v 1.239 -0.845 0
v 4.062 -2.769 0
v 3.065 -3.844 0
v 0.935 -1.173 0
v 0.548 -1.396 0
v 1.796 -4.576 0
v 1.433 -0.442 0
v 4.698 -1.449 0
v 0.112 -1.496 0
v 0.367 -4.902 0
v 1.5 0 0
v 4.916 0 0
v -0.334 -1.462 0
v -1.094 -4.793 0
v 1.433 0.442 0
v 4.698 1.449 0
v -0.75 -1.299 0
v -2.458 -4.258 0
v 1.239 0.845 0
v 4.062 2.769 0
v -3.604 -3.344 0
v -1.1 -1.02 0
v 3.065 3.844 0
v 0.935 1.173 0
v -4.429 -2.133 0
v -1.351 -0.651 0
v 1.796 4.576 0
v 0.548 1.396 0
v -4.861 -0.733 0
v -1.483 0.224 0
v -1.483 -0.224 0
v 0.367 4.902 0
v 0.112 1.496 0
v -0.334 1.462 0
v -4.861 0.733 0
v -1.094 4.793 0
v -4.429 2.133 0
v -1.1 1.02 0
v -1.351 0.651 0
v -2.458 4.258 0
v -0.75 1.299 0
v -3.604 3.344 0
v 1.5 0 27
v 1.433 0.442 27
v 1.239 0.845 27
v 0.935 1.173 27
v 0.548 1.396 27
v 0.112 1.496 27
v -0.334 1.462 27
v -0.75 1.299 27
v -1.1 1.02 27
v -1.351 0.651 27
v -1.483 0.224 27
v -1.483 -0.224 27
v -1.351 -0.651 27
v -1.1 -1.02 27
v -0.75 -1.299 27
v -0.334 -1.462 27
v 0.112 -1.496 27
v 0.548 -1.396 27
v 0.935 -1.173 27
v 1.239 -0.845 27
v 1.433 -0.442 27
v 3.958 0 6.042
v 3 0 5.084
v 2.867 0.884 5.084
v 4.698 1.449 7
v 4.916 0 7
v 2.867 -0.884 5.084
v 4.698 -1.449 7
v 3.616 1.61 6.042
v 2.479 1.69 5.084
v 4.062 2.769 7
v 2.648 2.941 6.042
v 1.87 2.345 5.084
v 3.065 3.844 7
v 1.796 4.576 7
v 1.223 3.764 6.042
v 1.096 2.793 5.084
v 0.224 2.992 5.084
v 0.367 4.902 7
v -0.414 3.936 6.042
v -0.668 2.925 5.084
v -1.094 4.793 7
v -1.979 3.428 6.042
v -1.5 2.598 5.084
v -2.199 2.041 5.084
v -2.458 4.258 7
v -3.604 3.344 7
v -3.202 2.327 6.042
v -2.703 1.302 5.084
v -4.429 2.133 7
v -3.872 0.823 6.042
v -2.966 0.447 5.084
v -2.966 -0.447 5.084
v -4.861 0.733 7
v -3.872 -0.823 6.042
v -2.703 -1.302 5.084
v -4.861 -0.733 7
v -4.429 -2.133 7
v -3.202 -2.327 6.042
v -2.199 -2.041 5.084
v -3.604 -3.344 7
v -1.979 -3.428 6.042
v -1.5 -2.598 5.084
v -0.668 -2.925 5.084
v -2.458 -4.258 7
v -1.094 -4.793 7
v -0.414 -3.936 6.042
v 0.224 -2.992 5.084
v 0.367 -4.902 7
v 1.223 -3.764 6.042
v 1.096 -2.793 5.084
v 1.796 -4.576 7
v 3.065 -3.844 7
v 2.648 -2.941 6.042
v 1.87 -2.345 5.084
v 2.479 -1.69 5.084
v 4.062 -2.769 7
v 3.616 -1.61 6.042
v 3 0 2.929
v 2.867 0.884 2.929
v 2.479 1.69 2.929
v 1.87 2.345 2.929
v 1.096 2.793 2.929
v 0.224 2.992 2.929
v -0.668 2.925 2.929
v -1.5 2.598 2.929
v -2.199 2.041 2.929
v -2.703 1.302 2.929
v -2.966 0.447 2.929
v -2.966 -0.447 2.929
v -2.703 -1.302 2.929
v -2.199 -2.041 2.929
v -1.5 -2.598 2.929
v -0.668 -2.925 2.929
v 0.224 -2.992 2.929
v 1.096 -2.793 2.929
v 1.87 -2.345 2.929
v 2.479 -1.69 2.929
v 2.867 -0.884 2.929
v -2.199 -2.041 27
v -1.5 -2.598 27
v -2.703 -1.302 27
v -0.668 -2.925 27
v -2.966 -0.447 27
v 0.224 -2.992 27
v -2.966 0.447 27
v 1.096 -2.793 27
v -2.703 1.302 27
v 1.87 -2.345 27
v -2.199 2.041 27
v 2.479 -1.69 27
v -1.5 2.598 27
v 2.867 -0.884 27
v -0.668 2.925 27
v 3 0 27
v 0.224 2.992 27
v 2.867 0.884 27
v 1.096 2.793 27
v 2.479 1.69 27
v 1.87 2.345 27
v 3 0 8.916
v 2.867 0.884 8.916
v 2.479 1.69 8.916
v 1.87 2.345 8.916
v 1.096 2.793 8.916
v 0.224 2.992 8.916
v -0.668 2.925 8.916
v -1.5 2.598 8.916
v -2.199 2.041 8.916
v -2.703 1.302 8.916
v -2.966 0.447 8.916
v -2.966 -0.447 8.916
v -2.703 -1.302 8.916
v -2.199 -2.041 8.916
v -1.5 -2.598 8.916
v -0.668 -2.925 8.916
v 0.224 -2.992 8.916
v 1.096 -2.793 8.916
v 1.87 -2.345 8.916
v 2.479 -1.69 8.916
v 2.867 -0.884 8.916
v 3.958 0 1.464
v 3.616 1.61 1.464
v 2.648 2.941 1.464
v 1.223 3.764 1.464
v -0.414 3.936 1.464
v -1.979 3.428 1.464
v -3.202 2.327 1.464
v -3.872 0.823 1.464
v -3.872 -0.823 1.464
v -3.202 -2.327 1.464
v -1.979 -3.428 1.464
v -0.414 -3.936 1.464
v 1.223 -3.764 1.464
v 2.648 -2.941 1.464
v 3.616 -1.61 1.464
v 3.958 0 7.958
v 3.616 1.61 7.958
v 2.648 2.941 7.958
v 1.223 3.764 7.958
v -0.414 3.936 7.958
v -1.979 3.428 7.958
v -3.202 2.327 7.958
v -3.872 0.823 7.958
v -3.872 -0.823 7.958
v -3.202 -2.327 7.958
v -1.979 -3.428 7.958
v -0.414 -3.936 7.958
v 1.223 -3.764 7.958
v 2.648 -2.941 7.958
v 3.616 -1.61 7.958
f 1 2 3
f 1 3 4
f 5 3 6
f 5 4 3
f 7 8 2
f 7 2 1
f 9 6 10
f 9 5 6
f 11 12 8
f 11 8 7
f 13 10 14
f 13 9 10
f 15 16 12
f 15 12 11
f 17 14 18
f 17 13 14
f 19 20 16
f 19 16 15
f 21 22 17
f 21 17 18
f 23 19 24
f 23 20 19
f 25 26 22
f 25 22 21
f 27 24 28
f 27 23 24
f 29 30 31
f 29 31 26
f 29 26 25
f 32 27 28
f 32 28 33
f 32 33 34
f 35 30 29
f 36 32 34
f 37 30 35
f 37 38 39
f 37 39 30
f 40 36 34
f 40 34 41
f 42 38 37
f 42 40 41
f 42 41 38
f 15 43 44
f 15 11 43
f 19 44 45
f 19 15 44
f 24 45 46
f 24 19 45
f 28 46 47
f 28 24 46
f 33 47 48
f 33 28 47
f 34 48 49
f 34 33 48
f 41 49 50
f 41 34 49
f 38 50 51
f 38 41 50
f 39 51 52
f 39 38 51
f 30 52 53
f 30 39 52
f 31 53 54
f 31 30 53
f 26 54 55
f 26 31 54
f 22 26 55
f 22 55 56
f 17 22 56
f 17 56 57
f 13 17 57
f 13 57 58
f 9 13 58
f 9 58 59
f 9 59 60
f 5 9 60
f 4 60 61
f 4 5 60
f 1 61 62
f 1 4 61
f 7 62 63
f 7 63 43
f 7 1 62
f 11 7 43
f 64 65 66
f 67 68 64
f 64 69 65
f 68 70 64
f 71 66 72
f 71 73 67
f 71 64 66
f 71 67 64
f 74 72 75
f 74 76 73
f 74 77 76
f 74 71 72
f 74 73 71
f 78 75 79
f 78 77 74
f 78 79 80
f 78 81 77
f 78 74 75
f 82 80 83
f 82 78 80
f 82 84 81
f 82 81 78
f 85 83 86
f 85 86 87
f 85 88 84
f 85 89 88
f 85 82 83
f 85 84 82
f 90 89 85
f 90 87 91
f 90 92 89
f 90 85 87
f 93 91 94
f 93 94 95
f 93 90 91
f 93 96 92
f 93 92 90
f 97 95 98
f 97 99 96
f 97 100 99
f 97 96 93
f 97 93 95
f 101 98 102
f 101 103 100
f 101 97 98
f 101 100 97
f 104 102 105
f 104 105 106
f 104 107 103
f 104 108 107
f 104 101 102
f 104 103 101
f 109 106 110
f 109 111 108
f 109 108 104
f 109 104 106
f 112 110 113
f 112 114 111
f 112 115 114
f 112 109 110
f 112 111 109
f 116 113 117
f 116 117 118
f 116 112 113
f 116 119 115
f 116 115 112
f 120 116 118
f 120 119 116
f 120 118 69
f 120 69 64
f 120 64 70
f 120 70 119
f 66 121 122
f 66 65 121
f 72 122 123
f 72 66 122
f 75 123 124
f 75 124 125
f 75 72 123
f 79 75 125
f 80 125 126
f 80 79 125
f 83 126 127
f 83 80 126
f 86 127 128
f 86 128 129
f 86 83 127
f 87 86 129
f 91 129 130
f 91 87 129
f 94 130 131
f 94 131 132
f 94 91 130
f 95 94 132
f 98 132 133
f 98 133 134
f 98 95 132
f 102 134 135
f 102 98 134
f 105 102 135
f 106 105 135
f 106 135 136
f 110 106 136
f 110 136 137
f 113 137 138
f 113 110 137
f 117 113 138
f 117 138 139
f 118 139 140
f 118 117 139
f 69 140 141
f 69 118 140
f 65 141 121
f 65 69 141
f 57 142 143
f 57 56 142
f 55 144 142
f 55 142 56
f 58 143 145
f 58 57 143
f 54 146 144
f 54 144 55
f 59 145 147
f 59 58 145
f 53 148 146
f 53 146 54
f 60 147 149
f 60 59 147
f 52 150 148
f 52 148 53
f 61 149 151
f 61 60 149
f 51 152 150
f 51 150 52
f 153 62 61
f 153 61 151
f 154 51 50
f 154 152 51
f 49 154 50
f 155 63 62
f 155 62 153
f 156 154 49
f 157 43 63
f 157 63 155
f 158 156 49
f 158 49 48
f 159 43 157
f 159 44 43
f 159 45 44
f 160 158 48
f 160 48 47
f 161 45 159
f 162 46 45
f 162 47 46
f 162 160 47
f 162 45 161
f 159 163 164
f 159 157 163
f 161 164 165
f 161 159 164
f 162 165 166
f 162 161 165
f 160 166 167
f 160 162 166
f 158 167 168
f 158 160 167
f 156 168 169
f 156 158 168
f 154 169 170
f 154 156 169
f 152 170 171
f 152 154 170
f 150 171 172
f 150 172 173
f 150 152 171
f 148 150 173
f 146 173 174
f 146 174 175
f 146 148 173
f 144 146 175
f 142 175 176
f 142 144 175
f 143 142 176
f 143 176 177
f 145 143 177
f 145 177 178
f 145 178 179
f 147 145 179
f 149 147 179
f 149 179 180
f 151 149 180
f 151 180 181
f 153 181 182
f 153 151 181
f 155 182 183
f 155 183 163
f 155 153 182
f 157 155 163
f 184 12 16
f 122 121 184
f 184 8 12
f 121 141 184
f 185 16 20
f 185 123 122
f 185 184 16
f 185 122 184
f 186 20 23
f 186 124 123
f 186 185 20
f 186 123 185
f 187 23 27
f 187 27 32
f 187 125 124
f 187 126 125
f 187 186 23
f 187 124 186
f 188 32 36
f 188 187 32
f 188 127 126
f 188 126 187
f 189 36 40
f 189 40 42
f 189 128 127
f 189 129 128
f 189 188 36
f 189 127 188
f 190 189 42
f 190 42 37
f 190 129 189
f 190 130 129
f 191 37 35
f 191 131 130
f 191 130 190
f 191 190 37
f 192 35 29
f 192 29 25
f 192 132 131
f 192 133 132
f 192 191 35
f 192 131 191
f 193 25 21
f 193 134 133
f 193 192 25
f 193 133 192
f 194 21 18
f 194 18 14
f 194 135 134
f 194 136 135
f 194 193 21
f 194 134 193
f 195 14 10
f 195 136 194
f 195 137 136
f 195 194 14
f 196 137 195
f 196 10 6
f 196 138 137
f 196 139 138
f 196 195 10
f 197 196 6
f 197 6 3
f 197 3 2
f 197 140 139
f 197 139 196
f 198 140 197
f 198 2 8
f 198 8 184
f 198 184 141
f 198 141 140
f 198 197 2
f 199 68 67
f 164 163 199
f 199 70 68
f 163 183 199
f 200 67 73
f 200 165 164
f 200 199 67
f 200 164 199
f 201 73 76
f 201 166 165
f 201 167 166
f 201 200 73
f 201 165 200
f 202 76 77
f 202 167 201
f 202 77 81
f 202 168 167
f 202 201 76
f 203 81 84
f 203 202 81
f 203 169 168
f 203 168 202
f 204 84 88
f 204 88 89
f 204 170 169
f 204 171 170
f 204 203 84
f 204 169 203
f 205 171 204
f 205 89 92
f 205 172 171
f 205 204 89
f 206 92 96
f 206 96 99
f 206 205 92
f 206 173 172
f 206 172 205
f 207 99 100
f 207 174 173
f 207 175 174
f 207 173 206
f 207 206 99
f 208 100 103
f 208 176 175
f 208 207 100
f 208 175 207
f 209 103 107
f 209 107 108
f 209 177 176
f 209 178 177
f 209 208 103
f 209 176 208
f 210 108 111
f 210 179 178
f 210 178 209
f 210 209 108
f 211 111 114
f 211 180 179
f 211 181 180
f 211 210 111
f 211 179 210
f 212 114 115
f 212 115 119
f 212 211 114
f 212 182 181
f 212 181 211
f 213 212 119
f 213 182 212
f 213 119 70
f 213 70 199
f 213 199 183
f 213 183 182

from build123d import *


with BuildPart() as f1:
    # F0 (on Front) → F1 (revolve)
    with BuildSketch(Plane.XZ):
        Polygon((3, 27), (1.5, 27), (1.5, 0), (4.916227, 0), (3, 2.928835), (3, 5.083773), (3, 8.916227), align=None)
        Polygon((4.916227, 7), (3, 8.916227), (3, 5.083773), align=None)
    revolve(axis=Axis((0, 0, 11), (0, 0, 1)))


solid = f1.part
